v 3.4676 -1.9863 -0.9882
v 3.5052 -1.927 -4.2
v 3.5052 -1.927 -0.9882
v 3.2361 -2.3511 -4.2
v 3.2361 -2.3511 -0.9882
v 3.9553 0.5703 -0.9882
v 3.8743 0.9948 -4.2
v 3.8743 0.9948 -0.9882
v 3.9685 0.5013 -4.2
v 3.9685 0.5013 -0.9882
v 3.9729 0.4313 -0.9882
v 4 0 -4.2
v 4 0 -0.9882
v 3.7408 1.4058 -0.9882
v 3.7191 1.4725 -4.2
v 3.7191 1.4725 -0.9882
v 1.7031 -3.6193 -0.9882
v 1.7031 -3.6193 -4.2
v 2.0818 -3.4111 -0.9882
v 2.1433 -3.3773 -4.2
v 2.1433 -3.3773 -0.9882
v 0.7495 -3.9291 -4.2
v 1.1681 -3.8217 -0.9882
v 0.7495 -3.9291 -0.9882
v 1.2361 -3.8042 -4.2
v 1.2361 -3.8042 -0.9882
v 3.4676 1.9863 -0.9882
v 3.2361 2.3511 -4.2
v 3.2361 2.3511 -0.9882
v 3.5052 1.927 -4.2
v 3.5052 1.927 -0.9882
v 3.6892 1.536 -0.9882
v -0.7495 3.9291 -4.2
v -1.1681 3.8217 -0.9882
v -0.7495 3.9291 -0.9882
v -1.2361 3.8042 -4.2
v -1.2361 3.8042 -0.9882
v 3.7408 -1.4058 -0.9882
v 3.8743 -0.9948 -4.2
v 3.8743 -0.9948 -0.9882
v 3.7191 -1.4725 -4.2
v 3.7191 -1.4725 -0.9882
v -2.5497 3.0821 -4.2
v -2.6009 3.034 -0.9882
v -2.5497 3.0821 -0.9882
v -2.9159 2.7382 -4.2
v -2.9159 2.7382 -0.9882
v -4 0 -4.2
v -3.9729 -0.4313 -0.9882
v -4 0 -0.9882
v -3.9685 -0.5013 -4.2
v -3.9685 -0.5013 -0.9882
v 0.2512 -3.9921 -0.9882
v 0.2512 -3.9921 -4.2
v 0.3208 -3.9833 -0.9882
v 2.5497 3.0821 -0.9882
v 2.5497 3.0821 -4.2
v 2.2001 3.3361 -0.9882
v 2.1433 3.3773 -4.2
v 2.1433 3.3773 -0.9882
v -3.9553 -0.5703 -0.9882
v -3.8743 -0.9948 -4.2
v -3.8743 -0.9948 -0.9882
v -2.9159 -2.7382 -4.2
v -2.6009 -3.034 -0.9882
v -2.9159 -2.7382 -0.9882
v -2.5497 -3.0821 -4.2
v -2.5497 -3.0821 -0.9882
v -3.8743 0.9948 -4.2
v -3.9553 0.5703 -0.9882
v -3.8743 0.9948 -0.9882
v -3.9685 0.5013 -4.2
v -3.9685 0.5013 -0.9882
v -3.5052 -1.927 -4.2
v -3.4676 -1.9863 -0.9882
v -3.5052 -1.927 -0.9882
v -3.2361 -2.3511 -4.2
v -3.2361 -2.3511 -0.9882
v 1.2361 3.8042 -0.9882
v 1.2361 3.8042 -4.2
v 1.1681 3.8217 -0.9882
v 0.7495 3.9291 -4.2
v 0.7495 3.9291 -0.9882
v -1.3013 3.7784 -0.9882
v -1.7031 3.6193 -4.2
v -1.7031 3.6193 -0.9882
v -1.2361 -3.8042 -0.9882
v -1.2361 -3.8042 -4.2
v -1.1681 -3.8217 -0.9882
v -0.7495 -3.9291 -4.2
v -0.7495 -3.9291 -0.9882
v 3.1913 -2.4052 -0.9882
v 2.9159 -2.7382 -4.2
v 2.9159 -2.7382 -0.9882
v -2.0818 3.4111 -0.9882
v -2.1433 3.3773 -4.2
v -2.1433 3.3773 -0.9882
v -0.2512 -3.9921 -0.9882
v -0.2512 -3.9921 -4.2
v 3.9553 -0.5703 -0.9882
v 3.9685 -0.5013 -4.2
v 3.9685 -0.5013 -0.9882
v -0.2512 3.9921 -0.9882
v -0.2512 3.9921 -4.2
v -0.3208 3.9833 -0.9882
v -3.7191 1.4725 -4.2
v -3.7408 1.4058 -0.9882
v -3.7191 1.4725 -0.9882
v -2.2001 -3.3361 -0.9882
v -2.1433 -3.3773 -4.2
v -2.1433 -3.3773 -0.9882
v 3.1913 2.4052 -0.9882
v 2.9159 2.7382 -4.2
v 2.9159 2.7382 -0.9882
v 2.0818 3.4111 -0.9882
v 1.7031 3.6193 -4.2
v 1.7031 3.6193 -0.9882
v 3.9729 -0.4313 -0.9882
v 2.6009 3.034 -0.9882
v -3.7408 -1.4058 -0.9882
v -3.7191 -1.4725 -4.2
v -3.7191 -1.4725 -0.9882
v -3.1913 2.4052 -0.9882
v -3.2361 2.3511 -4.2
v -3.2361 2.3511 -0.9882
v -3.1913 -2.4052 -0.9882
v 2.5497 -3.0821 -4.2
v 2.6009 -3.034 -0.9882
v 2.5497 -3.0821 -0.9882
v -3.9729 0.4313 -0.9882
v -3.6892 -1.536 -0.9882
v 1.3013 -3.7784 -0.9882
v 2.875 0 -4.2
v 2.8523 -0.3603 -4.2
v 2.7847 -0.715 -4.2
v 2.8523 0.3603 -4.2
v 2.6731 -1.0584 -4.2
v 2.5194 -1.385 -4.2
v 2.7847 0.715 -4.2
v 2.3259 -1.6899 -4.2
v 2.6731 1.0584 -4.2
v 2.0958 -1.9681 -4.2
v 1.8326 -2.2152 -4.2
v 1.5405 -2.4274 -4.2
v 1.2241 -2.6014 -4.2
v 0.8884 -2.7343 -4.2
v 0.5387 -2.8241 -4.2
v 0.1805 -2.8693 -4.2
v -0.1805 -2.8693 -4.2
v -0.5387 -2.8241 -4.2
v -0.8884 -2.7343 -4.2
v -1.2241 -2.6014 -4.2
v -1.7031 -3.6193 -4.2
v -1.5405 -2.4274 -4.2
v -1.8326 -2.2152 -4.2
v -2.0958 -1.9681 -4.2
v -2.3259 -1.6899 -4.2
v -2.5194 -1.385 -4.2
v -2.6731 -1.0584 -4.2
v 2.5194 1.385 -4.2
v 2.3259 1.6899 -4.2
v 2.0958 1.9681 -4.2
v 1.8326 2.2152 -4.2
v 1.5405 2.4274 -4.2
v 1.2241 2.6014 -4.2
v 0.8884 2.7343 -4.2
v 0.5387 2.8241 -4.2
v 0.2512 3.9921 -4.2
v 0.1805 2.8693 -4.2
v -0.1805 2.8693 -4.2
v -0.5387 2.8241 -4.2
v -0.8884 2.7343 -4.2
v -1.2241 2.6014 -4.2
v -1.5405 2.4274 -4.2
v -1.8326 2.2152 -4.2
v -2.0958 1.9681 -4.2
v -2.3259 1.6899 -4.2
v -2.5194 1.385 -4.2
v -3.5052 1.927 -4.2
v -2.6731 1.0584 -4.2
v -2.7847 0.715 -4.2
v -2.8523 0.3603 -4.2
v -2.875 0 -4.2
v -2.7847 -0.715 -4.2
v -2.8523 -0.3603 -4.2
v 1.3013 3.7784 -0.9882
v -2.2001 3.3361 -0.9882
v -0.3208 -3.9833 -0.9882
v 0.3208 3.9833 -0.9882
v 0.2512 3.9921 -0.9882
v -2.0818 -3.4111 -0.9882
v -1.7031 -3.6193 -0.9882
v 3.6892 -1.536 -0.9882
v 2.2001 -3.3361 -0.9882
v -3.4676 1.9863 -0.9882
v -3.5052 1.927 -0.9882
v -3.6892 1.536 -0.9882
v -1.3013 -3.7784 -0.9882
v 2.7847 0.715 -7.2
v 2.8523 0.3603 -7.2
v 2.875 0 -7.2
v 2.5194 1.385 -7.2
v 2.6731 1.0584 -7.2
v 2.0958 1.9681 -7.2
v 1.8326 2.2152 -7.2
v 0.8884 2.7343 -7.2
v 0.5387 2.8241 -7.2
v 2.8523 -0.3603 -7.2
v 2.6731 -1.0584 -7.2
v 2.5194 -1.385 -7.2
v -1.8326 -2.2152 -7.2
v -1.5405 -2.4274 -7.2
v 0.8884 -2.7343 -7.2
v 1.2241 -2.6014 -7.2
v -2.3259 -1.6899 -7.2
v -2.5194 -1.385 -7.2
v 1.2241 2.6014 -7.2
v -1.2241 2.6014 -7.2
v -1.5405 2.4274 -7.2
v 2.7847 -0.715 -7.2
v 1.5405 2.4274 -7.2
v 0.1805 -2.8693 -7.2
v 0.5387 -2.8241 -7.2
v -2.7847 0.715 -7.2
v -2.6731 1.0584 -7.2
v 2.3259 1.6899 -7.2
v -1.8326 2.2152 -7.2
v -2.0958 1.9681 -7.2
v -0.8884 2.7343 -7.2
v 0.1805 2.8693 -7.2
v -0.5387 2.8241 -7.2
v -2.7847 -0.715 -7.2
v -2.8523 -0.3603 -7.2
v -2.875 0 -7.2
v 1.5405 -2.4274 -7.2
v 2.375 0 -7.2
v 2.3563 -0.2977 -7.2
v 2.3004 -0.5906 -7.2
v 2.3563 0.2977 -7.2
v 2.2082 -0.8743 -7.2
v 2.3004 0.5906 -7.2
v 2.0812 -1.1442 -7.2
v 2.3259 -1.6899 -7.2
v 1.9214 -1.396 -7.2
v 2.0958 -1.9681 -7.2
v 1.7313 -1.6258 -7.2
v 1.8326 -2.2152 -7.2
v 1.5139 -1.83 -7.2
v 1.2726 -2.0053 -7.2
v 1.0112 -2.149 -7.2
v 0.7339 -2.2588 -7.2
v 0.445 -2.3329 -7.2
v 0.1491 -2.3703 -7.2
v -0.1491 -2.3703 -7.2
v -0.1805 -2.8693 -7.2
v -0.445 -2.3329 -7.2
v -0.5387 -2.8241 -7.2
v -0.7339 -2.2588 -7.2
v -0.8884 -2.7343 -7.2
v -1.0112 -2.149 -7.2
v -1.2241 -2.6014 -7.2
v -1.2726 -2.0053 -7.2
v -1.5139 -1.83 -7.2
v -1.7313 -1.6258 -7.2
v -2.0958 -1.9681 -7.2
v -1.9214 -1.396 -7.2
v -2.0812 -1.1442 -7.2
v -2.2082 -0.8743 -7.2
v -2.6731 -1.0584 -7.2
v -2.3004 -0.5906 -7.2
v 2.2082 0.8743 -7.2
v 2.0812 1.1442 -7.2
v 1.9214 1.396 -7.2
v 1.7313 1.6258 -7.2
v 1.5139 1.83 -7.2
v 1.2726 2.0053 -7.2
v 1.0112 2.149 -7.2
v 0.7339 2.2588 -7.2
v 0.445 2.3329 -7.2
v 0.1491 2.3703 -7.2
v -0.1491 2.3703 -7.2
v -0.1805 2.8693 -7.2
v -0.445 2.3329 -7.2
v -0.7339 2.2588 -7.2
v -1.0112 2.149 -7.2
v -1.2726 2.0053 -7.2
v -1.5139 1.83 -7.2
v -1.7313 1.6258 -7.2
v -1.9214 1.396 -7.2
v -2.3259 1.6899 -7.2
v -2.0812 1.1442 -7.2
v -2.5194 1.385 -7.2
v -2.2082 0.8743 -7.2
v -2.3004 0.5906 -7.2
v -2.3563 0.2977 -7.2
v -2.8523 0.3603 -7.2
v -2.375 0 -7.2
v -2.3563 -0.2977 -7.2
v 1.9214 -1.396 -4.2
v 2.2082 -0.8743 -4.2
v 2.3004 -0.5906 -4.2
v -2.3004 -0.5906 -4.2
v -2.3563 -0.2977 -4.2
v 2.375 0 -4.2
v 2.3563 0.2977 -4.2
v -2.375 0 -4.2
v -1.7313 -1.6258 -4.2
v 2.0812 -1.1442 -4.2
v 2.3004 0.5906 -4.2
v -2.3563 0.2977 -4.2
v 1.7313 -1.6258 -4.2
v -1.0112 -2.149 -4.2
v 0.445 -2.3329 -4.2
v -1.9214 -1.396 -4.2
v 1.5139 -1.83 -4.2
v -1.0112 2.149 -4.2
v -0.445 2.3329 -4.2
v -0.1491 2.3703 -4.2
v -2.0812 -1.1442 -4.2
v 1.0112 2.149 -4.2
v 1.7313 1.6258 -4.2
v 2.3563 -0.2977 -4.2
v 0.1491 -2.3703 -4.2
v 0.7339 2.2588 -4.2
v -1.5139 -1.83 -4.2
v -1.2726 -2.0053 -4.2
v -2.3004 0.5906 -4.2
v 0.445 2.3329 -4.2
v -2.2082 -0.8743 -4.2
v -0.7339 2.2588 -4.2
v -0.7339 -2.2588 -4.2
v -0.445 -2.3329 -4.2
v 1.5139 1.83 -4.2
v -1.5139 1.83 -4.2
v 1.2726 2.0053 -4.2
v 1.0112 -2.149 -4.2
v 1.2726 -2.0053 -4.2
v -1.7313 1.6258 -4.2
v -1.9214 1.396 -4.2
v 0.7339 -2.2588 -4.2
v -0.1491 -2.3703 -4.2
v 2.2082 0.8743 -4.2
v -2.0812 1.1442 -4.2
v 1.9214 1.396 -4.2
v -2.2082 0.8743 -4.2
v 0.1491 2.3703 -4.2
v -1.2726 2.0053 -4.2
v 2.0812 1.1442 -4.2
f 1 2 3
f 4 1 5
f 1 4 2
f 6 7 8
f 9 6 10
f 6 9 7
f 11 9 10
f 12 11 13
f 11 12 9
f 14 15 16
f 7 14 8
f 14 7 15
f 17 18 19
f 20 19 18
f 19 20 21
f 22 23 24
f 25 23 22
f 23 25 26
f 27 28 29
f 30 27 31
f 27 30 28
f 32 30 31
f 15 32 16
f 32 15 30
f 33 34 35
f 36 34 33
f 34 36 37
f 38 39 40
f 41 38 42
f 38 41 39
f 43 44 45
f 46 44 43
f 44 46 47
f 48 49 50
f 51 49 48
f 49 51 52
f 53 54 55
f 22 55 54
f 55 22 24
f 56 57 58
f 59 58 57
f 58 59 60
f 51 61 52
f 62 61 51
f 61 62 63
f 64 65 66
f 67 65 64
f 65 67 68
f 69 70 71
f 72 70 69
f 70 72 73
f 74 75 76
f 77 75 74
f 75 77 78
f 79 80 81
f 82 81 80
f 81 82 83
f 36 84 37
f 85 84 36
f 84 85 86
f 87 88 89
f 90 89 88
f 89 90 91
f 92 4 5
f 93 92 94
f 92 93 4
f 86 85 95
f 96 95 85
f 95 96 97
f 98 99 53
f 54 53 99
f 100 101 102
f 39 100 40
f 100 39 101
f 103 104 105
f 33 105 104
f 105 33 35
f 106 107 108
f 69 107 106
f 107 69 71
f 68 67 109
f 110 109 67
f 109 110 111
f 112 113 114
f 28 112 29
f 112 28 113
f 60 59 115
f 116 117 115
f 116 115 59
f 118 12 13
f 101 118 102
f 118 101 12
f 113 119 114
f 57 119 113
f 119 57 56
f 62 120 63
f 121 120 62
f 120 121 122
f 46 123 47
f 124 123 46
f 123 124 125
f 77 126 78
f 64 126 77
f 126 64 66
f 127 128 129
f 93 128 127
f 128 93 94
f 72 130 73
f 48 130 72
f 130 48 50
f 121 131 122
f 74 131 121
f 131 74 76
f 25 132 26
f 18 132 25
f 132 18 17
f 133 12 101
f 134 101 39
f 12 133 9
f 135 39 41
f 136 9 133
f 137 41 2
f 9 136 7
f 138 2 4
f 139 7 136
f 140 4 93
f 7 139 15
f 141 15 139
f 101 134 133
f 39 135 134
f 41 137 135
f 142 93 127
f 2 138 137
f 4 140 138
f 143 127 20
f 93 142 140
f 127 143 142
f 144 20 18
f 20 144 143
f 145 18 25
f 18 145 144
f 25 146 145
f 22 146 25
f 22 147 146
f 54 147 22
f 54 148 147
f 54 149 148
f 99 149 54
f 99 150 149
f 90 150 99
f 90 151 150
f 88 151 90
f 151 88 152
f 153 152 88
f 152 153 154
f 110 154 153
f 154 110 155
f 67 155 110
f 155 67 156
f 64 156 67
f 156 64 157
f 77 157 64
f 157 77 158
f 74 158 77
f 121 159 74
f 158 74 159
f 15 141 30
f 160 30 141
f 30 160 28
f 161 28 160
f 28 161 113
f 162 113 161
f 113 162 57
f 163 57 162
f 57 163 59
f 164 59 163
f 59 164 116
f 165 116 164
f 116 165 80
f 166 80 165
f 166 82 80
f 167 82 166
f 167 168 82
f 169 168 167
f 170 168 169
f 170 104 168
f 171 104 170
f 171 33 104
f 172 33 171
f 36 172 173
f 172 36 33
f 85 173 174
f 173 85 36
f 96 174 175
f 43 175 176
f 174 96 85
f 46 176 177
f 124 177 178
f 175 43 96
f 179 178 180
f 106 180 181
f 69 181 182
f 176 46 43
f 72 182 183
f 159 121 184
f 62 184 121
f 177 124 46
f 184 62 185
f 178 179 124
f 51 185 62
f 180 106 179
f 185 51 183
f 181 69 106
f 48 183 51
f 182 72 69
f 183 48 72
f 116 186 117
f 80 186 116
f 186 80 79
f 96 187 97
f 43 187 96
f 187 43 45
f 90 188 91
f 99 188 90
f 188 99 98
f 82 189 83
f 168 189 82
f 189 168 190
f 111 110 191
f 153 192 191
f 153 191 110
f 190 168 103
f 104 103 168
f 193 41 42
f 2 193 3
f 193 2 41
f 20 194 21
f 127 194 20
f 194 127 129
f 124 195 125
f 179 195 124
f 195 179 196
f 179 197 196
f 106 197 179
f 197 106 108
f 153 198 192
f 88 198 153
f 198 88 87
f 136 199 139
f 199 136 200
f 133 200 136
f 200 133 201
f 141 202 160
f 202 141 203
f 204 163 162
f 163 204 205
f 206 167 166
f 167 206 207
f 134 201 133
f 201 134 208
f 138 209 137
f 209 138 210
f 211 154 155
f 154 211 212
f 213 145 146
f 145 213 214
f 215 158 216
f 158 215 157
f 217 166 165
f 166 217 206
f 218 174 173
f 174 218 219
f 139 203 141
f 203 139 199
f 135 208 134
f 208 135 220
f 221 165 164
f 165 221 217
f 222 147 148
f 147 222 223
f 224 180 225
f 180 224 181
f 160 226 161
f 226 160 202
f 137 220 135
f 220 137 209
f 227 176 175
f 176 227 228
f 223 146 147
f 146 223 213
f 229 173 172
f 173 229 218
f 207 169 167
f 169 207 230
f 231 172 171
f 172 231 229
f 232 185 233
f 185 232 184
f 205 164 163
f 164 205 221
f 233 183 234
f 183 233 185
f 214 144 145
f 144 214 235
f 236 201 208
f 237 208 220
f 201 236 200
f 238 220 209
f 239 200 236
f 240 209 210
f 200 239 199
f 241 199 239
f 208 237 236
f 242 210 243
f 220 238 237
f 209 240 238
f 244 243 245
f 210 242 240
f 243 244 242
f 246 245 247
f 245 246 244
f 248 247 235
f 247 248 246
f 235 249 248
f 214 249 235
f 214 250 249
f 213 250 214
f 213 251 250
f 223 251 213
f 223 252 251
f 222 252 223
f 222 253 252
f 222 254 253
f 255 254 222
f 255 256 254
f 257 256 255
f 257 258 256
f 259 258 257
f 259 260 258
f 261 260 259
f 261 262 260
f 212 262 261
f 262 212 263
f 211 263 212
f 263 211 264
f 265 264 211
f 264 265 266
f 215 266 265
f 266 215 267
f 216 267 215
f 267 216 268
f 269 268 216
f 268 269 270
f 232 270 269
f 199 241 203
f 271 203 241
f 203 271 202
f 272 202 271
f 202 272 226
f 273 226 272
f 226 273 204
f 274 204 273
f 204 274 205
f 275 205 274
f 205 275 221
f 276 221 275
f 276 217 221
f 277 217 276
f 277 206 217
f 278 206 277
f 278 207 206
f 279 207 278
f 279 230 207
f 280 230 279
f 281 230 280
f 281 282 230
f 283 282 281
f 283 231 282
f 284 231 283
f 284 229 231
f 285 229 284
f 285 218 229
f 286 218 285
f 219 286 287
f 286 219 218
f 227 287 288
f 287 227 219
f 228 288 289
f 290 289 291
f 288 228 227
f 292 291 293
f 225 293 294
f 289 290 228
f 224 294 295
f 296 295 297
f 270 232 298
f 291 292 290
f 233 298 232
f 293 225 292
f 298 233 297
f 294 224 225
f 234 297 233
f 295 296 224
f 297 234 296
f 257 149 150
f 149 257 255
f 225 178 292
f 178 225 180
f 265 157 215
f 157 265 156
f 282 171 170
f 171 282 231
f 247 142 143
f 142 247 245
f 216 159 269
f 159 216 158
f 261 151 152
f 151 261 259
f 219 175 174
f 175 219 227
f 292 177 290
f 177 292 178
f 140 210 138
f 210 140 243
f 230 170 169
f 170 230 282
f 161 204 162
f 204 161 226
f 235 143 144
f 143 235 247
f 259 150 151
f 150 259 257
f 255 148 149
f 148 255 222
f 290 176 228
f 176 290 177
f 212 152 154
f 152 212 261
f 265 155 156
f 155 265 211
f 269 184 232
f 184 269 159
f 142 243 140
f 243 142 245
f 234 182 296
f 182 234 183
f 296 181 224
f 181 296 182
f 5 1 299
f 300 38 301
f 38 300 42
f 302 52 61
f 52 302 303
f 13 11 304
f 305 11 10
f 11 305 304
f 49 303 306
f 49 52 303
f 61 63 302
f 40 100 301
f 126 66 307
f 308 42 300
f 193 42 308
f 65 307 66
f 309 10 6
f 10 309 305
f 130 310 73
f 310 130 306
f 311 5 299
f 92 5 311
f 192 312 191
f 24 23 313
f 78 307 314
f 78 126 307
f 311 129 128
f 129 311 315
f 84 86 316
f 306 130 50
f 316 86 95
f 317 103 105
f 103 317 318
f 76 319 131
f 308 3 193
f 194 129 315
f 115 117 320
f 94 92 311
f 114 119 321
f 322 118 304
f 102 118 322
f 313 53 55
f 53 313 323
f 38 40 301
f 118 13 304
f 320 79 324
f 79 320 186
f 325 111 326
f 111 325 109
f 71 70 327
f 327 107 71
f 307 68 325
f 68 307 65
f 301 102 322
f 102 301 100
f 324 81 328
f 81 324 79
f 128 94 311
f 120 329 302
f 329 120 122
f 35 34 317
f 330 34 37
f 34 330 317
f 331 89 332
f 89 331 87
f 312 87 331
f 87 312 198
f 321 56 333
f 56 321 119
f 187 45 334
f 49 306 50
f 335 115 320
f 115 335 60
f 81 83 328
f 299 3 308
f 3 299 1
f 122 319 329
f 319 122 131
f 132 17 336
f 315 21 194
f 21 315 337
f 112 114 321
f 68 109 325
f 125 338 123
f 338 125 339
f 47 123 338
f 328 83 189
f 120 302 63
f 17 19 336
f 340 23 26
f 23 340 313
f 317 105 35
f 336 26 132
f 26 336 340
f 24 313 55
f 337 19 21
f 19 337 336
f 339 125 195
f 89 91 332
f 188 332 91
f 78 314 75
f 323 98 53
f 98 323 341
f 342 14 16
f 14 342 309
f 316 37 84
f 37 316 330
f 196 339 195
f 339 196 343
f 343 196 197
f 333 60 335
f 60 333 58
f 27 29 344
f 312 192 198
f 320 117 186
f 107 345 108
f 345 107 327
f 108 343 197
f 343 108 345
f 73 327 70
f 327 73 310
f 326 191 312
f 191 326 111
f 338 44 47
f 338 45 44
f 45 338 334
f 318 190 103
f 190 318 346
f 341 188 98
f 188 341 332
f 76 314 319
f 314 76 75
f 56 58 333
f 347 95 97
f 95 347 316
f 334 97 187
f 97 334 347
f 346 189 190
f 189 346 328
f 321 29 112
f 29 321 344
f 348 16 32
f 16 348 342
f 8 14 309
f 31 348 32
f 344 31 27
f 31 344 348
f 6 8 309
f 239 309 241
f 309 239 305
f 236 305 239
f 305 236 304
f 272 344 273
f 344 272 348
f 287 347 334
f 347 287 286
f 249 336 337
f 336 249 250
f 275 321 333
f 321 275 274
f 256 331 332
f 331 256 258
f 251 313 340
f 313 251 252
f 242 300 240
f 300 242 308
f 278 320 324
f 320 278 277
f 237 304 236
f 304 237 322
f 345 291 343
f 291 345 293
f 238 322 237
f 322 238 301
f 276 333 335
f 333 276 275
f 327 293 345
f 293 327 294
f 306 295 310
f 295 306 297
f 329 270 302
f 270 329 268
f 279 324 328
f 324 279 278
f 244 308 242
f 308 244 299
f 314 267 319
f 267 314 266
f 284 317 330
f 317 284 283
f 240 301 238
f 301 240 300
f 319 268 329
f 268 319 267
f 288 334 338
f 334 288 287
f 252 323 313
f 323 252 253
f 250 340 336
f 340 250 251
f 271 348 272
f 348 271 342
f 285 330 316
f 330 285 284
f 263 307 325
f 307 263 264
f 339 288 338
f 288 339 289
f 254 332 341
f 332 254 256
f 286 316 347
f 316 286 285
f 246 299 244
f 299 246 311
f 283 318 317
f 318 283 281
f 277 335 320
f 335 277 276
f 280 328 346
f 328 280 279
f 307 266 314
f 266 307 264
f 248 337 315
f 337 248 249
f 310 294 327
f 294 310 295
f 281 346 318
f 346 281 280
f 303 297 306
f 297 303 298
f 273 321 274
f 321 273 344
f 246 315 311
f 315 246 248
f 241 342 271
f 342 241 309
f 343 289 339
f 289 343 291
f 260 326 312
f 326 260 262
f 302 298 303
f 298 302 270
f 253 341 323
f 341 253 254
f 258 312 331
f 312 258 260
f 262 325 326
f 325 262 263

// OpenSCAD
$fn = 50;

difference() {
	union() {
		translate(v = [0, 0, -4.2]) {
			cylinder(h = 4.2, r = 4.0);
		}
		#translate(v = [0, 0, -7.2]) {
			cylinder(h = 7.2, r = 2.875);
		}
	}
	union() {
		translate(v = [0, 0, 0]) {
			rotate(a = [0, 0, 0]) {
				difference() {
					union() {
						translate(v = [0, 0, -7.2]) {
							cylinder(h = 7.2, r = 2.25);
						}
						translate(v = [0, 0, -4.2]) {
							cylinder(h = 4.2, r1 = 2.375, r2 = 4.5);
						}
						translate(v = [0, 0, -7.2]) {
							cylinder(h = 7.2, r = 2.375);
						}
						translate(v = [0, 0, -7.2]) {
							cylinder(h = 7.2, r = 2.25);
						}
					}
					union();
				}
			}
		}
	}
}
